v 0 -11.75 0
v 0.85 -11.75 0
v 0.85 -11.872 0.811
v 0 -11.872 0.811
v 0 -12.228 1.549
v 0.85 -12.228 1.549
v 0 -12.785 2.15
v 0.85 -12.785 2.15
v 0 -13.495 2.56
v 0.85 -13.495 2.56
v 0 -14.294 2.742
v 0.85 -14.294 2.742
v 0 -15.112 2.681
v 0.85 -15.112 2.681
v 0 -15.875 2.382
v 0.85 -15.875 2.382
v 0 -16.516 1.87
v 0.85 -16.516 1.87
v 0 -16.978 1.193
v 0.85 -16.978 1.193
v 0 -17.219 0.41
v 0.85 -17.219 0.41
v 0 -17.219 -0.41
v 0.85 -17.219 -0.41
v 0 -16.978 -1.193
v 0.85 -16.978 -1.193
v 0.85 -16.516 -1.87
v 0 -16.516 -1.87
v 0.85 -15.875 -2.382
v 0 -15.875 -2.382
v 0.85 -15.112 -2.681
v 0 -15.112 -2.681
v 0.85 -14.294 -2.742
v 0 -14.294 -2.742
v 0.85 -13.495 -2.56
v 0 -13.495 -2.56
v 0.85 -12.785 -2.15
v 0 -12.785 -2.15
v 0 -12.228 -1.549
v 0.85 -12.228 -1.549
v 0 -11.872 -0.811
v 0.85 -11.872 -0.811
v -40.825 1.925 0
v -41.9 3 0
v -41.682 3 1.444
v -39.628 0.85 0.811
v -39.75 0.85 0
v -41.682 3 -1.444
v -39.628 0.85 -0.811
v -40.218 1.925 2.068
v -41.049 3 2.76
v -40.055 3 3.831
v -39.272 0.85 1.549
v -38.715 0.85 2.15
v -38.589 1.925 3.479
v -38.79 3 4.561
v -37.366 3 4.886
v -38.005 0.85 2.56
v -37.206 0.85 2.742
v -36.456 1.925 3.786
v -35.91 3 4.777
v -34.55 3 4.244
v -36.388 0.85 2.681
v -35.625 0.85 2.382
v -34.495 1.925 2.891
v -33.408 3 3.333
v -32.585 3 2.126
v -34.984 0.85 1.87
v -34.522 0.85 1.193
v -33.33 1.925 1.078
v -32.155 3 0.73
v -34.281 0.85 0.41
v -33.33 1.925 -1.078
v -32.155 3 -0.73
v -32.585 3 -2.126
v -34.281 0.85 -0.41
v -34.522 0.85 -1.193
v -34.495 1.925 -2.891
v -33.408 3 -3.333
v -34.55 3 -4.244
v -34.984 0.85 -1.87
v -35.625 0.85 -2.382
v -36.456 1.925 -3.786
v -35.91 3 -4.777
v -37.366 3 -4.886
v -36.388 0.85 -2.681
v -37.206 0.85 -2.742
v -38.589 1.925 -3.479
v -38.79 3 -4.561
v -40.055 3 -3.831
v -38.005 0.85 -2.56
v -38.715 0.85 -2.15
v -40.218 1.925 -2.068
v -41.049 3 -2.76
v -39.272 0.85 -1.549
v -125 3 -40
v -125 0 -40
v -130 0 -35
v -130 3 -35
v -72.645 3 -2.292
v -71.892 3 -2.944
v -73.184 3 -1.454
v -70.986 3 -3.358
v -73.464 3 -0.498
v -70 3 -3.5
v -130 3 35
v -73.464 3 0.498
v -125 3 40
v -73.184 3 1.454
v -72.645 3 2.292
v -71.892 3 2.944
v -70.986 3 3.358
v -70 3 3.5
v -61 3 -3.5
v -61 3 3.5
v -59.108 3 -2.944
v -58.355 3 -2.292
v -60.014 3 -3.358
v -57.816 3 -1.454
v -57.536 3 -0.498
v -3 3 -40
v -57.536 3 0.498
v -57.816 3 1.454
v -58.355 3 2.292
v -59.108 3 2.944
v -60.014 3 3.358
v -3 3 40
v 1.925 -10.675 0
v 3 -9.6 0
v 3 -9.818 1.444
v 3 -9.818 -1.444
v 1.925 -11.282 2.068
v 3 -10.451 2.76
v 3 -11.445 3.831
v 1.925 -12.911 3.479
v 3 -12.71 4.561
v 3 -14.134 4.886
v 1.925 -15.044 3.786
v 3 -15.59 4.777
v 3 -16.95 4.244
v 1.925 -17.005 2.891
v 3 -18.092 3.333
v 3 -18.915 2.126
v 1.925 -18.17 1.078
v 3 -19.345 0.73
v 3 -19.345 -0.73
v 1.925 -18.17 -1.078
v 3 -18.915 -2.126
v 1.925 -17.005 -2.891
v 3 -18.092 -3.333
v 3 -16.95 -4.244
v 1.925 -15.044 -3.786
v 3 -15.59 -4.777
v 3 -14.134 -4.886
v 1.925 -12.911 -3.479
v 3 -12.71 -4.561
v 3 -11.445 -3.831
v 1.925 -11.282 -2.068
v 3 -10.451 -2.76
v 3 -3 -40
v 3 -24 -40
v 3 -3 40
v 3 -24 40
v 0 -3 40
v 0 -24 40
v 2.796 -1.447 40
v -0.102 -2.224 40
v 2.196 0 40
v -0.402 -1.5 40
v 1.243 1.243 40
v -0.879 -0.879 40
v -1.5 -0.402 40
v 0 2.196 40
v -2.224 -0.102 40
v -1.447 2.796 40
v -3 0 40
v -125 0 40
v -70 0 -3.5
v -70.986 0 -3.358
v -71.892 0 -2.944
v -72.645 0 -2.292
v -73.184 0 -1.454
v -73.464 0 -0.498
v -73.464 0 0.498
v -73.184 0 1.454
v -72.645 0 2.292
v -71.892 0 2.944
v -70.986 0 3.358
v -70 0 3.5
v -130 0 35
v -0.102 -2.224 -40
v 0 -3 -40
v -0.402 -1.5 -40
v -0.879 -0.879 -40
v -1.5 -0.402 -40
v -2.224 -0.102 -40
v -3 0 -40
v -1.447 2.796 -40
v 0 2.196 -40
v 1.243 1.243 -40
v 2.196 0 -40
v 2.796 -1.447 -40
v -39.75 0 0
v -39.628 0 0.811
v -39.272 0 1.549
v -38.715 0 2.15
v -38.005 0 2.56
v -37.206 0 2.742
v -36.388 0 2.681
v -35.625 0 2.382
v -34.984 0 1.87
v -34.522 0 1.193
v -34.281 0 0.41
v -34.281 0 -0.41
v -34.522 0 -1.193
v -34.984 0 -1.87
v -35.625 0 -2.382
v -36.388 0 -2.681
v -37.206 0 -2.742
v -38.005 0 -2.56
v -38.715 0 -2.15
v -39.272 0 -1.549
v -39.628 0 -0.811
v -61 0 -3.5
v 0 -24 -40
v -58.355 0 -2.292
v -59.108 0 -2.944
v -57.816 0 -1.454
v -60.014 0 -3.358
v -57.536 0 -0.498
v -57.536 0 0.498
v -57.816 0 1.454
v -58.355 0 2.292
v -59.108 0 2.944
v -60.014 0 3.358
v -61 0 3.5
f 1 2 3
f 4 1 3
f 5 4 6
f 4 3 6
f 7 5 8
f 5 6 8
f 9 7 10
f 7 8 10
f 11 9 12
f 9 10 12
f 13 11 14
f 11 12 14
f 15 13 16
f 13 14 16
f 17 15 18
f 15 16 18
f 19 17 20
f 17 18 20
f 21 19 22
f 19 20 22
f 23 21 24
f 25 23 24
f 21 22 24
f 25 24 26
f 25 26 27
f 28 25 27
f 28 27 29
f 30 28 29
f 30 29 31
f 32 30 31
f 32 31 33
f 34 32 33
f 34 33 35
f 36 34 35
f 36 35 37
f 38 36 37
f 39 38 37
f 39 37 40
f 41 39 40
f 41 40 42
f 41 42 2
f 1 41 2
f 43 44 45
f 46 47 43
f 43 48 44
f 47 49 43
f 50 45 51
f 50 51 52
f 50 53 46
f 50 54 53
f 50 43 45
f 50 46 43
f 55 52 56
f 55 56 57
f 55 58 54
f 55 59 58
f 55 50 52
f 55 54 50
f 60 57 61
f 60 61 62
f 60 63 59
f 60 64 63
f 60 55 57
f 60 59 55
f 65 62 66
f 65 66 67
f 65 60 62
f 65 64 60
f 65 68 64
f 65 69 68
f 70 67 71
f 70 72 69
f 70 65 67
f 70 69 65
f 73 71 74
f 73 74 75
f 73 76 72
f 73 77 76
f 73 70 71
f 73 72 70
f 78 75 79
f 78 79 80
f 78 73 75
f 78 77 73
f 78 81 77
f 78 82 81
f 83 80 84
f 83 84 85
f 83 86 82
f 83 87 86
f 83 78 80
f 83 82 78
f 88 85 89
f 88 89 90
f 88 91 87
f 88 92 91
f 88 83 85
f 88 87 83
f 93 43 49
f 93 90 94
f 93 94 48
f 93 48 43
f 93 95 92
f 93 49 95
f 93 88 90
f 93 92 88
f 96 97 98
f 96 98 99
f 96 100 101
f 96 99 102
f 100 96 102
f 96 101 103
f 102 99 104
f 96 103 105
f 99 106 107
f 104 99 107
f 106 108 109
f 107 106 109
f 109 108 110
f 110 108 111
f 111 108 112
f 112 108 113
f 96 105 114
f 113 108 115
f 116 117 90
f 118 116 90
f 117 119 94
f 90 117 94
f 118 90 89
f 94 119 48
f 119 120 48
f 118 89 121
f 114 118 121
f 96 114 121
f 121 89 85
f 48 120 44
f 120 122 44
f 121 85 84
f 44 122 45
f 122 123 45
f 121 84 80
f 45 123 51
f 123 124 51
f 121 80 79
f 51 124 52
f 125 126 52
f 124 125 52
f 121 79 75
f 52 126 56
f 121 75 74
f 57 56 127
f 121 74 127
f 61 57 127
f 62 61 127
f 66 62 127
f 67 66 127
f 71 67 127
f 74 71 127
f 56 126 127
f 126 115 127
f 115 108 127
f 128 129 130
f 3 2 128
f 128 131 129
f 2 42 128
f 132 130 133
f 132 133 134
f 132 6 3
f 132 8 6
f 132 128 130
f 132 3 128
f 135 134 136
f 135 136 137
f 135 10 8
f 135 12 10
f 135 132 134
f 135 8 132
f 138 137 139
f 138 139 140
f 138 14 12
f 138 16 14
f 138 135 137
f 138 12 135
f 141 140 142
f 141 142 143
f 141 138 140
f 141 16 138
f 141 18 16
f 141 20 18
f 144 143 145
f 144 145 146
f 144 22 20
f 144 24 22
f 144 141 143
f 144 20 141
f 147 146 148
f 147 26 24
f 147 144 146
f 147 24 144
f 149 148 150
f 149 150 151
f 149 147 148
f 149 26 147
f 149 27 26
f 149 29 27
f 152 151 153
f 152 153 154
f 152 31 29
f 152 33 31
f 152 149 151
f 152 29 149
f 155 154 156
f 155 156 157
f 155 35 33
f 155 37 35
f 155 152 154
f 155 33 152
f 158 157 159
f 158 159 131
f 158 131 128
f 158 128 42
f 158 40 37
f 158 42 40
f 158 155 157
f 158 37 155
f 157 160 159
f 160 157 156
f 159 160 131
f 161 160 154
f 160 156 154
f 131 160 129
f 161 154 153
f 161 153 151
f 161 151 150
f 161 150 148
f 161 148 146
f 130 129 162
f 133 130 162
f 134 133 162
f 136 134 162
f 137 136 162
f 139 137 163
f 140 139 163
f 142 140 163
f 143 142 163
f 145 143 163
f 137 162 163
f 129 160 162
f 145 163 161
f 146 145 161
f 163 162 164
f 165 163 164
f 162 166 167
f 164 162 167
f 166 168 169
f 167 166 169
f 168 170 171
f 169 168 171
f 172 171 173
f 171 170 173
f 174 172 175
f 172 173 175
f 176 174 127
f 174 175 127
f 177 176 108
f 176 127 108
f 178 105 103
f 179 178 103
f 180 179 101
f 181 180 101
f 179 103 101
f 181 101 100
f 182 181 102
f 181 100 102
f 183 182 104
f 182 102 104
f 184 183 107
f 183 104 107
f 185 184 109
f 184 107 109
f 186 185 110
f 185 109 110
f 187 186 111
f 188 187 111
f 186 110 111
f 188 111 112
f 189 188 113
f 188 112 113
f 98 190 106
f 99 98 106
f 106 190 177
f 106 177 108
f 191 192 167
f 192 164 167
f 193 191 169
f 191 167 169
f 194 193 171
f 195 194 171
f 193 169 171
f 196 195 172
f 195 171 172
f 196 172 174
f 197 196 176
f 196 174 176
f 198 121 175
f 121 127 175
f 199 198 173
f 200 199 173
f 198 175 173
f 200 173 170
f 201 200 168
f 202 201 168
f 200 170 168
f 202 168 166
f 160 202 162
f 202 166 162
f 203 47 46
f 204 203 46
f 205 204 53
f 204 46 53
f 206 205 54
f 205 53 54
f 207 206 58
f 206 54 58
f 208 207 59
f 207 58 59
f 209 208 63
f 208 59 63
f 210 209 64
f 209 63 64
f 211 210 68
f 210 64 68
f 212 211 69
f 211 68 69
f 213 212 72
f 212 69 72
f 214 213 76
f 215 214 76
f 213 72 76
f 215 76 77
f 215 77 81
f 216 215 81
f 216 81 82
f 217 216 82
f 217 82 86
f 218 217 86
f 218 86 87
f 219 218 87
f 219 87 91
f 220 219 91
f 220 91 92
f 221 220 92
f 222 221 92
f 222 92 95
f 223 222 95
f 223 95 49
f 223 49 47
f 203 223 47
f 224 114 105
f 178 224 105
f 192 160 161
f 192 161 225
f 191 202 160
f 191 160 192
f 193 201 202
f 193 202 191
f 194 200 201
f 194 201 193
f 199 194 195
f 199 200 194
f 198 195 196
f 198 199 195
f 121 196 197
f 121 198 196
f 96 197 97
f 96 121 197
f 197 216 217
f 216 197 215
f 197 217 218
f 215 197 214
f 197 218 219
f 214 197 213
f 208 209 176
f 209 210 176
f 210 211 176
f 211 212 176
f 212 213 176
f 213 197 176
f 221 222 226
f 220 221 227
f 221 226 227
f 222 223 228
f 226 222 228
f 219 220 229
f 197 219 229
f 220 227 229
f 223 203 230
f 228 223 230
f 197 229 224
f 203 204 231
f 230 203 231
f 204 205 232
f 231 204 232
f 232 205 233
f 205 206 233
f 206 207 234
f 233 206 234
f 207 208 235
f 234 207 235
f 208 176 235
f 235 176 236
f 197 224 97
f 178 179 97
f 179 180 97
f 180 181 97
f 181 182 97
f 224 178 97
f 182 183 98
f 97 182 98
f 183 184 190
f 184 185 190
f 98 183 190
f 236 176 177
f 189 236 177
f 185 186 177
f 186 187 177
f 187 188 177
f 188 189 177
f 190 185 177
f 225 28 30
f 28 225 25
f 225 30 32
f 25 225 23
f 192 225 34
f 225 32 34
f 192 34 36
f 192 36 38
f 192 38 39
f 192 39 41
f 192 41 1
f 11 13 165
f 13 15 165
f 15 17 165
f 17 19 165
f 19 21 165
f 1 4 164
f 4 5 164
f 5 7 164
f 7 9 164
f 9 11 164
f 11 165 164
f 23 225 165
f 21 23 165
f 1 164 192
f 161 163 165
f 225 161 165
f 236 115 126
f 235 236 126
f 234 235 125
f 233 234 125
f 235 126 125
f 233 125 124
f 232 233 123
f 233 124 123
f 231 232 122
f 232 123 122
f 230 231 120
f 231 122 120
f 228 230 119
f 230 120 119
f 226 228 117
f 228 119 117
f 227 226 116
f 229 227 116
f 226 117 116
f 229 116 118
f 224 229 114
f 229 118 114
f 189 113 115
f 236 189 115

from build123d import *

# Parameters (mm, degrees)
BASE_EXTRU_MINCE_DEPTH  = 40
CHANFREIN1_SIZE         = 5
ESQUISSE3_R             = 2.75
ENL_V_MAT_EXTRU_1_DEPTH = 139.668669857
ESQUISSE4_R             = 2.75
ENL_V_MAT_EXTRU_2_DEPTH = 141.943250991
CHANFREIN2_SIZE         = 2.15


with BuildPart() as part:
    # Esquisse1 → Base-Extru.-Mince (new, symmetric)
    with BuildSketch(Plane.XY):
        with BuildLine():
            Line((0, -24), (0, -3))
            ThreePointArc((0, -3), (-0.878679656, -0.878679656), (-3, 0))
            Line((-3, 0), (-130, 0))
            Line((-130, 0), (-130, 3))
            Line((-130, 3), (-3, 3))
            ThreePointArc((-3, 3), (1.242640687, 1.242640687), (3, -3))
            Line((3, -3), (3, -24))
            Line((3, -24), (0, -24))
        make_face()
    extrude(amount=BASE_EXTRU_MINCE_DEPTH, both=True)

    # Chanfrein1
    chanfrein1_edges = [part.edges().sort_by_distance(p)[0] for p in [
        (-130, 1.5, -40),
        (-130, 1.5, 40),
    ]]
    chamfer(chanfrein1_edges, length=CHANFREIN1_SIZE)

    # Esquisse3 → Enlèv. mat.-Extru.1 (cut, through all)
    with BuildSketch(Plane(origin=(0, 3, 0), x_dir=(-1, 0, 0), z_dir=(0, 1, 0))):
        with Locations((37, 0)):
            Circle(ESQUISSE3_R)
        with BuildLine():
            Line((70, 3.5), (61, 3.5))
            ThreePointArc((61, 3.5), (57.5, 0), (61, -3.5))
            Line((61, -3.5), (70, -3.5))
            ThreePointArc((70, -3.5), (73.5, 0), (70, 3.5))
        make_face()
    extrude(amount=-ENL_V_MAT_EXTRU_1_DEPTH, mode=Mode.SUBTRACT)

    # Esquisse4 → Enlèv. mat.-Extru.2 (cut, through all)
    with BuildSketch(Plane(origin=(3, 0, 0), x_dir=(0, 0, -1), z_dir=(1, 0, 0))):
        with Locations((0, -14.5)):
            Circle(ESQUISSE4_R)
    extrude(amount=-ENL_V_MAT_EXTRU_2_DEPTH, mode=Mode.SUBTRACT)

    # Chanfrein2
    chanfrein2_edges = [part.edges().sort_by_distance(p)[0] for p in [
        (-34.25, 3, 0),
        (3, -14.5, 2.75),
    ]]
    chamfer(chanfrein2_edges, length=CHANFREIN2_SIZE)


solid = part.part
